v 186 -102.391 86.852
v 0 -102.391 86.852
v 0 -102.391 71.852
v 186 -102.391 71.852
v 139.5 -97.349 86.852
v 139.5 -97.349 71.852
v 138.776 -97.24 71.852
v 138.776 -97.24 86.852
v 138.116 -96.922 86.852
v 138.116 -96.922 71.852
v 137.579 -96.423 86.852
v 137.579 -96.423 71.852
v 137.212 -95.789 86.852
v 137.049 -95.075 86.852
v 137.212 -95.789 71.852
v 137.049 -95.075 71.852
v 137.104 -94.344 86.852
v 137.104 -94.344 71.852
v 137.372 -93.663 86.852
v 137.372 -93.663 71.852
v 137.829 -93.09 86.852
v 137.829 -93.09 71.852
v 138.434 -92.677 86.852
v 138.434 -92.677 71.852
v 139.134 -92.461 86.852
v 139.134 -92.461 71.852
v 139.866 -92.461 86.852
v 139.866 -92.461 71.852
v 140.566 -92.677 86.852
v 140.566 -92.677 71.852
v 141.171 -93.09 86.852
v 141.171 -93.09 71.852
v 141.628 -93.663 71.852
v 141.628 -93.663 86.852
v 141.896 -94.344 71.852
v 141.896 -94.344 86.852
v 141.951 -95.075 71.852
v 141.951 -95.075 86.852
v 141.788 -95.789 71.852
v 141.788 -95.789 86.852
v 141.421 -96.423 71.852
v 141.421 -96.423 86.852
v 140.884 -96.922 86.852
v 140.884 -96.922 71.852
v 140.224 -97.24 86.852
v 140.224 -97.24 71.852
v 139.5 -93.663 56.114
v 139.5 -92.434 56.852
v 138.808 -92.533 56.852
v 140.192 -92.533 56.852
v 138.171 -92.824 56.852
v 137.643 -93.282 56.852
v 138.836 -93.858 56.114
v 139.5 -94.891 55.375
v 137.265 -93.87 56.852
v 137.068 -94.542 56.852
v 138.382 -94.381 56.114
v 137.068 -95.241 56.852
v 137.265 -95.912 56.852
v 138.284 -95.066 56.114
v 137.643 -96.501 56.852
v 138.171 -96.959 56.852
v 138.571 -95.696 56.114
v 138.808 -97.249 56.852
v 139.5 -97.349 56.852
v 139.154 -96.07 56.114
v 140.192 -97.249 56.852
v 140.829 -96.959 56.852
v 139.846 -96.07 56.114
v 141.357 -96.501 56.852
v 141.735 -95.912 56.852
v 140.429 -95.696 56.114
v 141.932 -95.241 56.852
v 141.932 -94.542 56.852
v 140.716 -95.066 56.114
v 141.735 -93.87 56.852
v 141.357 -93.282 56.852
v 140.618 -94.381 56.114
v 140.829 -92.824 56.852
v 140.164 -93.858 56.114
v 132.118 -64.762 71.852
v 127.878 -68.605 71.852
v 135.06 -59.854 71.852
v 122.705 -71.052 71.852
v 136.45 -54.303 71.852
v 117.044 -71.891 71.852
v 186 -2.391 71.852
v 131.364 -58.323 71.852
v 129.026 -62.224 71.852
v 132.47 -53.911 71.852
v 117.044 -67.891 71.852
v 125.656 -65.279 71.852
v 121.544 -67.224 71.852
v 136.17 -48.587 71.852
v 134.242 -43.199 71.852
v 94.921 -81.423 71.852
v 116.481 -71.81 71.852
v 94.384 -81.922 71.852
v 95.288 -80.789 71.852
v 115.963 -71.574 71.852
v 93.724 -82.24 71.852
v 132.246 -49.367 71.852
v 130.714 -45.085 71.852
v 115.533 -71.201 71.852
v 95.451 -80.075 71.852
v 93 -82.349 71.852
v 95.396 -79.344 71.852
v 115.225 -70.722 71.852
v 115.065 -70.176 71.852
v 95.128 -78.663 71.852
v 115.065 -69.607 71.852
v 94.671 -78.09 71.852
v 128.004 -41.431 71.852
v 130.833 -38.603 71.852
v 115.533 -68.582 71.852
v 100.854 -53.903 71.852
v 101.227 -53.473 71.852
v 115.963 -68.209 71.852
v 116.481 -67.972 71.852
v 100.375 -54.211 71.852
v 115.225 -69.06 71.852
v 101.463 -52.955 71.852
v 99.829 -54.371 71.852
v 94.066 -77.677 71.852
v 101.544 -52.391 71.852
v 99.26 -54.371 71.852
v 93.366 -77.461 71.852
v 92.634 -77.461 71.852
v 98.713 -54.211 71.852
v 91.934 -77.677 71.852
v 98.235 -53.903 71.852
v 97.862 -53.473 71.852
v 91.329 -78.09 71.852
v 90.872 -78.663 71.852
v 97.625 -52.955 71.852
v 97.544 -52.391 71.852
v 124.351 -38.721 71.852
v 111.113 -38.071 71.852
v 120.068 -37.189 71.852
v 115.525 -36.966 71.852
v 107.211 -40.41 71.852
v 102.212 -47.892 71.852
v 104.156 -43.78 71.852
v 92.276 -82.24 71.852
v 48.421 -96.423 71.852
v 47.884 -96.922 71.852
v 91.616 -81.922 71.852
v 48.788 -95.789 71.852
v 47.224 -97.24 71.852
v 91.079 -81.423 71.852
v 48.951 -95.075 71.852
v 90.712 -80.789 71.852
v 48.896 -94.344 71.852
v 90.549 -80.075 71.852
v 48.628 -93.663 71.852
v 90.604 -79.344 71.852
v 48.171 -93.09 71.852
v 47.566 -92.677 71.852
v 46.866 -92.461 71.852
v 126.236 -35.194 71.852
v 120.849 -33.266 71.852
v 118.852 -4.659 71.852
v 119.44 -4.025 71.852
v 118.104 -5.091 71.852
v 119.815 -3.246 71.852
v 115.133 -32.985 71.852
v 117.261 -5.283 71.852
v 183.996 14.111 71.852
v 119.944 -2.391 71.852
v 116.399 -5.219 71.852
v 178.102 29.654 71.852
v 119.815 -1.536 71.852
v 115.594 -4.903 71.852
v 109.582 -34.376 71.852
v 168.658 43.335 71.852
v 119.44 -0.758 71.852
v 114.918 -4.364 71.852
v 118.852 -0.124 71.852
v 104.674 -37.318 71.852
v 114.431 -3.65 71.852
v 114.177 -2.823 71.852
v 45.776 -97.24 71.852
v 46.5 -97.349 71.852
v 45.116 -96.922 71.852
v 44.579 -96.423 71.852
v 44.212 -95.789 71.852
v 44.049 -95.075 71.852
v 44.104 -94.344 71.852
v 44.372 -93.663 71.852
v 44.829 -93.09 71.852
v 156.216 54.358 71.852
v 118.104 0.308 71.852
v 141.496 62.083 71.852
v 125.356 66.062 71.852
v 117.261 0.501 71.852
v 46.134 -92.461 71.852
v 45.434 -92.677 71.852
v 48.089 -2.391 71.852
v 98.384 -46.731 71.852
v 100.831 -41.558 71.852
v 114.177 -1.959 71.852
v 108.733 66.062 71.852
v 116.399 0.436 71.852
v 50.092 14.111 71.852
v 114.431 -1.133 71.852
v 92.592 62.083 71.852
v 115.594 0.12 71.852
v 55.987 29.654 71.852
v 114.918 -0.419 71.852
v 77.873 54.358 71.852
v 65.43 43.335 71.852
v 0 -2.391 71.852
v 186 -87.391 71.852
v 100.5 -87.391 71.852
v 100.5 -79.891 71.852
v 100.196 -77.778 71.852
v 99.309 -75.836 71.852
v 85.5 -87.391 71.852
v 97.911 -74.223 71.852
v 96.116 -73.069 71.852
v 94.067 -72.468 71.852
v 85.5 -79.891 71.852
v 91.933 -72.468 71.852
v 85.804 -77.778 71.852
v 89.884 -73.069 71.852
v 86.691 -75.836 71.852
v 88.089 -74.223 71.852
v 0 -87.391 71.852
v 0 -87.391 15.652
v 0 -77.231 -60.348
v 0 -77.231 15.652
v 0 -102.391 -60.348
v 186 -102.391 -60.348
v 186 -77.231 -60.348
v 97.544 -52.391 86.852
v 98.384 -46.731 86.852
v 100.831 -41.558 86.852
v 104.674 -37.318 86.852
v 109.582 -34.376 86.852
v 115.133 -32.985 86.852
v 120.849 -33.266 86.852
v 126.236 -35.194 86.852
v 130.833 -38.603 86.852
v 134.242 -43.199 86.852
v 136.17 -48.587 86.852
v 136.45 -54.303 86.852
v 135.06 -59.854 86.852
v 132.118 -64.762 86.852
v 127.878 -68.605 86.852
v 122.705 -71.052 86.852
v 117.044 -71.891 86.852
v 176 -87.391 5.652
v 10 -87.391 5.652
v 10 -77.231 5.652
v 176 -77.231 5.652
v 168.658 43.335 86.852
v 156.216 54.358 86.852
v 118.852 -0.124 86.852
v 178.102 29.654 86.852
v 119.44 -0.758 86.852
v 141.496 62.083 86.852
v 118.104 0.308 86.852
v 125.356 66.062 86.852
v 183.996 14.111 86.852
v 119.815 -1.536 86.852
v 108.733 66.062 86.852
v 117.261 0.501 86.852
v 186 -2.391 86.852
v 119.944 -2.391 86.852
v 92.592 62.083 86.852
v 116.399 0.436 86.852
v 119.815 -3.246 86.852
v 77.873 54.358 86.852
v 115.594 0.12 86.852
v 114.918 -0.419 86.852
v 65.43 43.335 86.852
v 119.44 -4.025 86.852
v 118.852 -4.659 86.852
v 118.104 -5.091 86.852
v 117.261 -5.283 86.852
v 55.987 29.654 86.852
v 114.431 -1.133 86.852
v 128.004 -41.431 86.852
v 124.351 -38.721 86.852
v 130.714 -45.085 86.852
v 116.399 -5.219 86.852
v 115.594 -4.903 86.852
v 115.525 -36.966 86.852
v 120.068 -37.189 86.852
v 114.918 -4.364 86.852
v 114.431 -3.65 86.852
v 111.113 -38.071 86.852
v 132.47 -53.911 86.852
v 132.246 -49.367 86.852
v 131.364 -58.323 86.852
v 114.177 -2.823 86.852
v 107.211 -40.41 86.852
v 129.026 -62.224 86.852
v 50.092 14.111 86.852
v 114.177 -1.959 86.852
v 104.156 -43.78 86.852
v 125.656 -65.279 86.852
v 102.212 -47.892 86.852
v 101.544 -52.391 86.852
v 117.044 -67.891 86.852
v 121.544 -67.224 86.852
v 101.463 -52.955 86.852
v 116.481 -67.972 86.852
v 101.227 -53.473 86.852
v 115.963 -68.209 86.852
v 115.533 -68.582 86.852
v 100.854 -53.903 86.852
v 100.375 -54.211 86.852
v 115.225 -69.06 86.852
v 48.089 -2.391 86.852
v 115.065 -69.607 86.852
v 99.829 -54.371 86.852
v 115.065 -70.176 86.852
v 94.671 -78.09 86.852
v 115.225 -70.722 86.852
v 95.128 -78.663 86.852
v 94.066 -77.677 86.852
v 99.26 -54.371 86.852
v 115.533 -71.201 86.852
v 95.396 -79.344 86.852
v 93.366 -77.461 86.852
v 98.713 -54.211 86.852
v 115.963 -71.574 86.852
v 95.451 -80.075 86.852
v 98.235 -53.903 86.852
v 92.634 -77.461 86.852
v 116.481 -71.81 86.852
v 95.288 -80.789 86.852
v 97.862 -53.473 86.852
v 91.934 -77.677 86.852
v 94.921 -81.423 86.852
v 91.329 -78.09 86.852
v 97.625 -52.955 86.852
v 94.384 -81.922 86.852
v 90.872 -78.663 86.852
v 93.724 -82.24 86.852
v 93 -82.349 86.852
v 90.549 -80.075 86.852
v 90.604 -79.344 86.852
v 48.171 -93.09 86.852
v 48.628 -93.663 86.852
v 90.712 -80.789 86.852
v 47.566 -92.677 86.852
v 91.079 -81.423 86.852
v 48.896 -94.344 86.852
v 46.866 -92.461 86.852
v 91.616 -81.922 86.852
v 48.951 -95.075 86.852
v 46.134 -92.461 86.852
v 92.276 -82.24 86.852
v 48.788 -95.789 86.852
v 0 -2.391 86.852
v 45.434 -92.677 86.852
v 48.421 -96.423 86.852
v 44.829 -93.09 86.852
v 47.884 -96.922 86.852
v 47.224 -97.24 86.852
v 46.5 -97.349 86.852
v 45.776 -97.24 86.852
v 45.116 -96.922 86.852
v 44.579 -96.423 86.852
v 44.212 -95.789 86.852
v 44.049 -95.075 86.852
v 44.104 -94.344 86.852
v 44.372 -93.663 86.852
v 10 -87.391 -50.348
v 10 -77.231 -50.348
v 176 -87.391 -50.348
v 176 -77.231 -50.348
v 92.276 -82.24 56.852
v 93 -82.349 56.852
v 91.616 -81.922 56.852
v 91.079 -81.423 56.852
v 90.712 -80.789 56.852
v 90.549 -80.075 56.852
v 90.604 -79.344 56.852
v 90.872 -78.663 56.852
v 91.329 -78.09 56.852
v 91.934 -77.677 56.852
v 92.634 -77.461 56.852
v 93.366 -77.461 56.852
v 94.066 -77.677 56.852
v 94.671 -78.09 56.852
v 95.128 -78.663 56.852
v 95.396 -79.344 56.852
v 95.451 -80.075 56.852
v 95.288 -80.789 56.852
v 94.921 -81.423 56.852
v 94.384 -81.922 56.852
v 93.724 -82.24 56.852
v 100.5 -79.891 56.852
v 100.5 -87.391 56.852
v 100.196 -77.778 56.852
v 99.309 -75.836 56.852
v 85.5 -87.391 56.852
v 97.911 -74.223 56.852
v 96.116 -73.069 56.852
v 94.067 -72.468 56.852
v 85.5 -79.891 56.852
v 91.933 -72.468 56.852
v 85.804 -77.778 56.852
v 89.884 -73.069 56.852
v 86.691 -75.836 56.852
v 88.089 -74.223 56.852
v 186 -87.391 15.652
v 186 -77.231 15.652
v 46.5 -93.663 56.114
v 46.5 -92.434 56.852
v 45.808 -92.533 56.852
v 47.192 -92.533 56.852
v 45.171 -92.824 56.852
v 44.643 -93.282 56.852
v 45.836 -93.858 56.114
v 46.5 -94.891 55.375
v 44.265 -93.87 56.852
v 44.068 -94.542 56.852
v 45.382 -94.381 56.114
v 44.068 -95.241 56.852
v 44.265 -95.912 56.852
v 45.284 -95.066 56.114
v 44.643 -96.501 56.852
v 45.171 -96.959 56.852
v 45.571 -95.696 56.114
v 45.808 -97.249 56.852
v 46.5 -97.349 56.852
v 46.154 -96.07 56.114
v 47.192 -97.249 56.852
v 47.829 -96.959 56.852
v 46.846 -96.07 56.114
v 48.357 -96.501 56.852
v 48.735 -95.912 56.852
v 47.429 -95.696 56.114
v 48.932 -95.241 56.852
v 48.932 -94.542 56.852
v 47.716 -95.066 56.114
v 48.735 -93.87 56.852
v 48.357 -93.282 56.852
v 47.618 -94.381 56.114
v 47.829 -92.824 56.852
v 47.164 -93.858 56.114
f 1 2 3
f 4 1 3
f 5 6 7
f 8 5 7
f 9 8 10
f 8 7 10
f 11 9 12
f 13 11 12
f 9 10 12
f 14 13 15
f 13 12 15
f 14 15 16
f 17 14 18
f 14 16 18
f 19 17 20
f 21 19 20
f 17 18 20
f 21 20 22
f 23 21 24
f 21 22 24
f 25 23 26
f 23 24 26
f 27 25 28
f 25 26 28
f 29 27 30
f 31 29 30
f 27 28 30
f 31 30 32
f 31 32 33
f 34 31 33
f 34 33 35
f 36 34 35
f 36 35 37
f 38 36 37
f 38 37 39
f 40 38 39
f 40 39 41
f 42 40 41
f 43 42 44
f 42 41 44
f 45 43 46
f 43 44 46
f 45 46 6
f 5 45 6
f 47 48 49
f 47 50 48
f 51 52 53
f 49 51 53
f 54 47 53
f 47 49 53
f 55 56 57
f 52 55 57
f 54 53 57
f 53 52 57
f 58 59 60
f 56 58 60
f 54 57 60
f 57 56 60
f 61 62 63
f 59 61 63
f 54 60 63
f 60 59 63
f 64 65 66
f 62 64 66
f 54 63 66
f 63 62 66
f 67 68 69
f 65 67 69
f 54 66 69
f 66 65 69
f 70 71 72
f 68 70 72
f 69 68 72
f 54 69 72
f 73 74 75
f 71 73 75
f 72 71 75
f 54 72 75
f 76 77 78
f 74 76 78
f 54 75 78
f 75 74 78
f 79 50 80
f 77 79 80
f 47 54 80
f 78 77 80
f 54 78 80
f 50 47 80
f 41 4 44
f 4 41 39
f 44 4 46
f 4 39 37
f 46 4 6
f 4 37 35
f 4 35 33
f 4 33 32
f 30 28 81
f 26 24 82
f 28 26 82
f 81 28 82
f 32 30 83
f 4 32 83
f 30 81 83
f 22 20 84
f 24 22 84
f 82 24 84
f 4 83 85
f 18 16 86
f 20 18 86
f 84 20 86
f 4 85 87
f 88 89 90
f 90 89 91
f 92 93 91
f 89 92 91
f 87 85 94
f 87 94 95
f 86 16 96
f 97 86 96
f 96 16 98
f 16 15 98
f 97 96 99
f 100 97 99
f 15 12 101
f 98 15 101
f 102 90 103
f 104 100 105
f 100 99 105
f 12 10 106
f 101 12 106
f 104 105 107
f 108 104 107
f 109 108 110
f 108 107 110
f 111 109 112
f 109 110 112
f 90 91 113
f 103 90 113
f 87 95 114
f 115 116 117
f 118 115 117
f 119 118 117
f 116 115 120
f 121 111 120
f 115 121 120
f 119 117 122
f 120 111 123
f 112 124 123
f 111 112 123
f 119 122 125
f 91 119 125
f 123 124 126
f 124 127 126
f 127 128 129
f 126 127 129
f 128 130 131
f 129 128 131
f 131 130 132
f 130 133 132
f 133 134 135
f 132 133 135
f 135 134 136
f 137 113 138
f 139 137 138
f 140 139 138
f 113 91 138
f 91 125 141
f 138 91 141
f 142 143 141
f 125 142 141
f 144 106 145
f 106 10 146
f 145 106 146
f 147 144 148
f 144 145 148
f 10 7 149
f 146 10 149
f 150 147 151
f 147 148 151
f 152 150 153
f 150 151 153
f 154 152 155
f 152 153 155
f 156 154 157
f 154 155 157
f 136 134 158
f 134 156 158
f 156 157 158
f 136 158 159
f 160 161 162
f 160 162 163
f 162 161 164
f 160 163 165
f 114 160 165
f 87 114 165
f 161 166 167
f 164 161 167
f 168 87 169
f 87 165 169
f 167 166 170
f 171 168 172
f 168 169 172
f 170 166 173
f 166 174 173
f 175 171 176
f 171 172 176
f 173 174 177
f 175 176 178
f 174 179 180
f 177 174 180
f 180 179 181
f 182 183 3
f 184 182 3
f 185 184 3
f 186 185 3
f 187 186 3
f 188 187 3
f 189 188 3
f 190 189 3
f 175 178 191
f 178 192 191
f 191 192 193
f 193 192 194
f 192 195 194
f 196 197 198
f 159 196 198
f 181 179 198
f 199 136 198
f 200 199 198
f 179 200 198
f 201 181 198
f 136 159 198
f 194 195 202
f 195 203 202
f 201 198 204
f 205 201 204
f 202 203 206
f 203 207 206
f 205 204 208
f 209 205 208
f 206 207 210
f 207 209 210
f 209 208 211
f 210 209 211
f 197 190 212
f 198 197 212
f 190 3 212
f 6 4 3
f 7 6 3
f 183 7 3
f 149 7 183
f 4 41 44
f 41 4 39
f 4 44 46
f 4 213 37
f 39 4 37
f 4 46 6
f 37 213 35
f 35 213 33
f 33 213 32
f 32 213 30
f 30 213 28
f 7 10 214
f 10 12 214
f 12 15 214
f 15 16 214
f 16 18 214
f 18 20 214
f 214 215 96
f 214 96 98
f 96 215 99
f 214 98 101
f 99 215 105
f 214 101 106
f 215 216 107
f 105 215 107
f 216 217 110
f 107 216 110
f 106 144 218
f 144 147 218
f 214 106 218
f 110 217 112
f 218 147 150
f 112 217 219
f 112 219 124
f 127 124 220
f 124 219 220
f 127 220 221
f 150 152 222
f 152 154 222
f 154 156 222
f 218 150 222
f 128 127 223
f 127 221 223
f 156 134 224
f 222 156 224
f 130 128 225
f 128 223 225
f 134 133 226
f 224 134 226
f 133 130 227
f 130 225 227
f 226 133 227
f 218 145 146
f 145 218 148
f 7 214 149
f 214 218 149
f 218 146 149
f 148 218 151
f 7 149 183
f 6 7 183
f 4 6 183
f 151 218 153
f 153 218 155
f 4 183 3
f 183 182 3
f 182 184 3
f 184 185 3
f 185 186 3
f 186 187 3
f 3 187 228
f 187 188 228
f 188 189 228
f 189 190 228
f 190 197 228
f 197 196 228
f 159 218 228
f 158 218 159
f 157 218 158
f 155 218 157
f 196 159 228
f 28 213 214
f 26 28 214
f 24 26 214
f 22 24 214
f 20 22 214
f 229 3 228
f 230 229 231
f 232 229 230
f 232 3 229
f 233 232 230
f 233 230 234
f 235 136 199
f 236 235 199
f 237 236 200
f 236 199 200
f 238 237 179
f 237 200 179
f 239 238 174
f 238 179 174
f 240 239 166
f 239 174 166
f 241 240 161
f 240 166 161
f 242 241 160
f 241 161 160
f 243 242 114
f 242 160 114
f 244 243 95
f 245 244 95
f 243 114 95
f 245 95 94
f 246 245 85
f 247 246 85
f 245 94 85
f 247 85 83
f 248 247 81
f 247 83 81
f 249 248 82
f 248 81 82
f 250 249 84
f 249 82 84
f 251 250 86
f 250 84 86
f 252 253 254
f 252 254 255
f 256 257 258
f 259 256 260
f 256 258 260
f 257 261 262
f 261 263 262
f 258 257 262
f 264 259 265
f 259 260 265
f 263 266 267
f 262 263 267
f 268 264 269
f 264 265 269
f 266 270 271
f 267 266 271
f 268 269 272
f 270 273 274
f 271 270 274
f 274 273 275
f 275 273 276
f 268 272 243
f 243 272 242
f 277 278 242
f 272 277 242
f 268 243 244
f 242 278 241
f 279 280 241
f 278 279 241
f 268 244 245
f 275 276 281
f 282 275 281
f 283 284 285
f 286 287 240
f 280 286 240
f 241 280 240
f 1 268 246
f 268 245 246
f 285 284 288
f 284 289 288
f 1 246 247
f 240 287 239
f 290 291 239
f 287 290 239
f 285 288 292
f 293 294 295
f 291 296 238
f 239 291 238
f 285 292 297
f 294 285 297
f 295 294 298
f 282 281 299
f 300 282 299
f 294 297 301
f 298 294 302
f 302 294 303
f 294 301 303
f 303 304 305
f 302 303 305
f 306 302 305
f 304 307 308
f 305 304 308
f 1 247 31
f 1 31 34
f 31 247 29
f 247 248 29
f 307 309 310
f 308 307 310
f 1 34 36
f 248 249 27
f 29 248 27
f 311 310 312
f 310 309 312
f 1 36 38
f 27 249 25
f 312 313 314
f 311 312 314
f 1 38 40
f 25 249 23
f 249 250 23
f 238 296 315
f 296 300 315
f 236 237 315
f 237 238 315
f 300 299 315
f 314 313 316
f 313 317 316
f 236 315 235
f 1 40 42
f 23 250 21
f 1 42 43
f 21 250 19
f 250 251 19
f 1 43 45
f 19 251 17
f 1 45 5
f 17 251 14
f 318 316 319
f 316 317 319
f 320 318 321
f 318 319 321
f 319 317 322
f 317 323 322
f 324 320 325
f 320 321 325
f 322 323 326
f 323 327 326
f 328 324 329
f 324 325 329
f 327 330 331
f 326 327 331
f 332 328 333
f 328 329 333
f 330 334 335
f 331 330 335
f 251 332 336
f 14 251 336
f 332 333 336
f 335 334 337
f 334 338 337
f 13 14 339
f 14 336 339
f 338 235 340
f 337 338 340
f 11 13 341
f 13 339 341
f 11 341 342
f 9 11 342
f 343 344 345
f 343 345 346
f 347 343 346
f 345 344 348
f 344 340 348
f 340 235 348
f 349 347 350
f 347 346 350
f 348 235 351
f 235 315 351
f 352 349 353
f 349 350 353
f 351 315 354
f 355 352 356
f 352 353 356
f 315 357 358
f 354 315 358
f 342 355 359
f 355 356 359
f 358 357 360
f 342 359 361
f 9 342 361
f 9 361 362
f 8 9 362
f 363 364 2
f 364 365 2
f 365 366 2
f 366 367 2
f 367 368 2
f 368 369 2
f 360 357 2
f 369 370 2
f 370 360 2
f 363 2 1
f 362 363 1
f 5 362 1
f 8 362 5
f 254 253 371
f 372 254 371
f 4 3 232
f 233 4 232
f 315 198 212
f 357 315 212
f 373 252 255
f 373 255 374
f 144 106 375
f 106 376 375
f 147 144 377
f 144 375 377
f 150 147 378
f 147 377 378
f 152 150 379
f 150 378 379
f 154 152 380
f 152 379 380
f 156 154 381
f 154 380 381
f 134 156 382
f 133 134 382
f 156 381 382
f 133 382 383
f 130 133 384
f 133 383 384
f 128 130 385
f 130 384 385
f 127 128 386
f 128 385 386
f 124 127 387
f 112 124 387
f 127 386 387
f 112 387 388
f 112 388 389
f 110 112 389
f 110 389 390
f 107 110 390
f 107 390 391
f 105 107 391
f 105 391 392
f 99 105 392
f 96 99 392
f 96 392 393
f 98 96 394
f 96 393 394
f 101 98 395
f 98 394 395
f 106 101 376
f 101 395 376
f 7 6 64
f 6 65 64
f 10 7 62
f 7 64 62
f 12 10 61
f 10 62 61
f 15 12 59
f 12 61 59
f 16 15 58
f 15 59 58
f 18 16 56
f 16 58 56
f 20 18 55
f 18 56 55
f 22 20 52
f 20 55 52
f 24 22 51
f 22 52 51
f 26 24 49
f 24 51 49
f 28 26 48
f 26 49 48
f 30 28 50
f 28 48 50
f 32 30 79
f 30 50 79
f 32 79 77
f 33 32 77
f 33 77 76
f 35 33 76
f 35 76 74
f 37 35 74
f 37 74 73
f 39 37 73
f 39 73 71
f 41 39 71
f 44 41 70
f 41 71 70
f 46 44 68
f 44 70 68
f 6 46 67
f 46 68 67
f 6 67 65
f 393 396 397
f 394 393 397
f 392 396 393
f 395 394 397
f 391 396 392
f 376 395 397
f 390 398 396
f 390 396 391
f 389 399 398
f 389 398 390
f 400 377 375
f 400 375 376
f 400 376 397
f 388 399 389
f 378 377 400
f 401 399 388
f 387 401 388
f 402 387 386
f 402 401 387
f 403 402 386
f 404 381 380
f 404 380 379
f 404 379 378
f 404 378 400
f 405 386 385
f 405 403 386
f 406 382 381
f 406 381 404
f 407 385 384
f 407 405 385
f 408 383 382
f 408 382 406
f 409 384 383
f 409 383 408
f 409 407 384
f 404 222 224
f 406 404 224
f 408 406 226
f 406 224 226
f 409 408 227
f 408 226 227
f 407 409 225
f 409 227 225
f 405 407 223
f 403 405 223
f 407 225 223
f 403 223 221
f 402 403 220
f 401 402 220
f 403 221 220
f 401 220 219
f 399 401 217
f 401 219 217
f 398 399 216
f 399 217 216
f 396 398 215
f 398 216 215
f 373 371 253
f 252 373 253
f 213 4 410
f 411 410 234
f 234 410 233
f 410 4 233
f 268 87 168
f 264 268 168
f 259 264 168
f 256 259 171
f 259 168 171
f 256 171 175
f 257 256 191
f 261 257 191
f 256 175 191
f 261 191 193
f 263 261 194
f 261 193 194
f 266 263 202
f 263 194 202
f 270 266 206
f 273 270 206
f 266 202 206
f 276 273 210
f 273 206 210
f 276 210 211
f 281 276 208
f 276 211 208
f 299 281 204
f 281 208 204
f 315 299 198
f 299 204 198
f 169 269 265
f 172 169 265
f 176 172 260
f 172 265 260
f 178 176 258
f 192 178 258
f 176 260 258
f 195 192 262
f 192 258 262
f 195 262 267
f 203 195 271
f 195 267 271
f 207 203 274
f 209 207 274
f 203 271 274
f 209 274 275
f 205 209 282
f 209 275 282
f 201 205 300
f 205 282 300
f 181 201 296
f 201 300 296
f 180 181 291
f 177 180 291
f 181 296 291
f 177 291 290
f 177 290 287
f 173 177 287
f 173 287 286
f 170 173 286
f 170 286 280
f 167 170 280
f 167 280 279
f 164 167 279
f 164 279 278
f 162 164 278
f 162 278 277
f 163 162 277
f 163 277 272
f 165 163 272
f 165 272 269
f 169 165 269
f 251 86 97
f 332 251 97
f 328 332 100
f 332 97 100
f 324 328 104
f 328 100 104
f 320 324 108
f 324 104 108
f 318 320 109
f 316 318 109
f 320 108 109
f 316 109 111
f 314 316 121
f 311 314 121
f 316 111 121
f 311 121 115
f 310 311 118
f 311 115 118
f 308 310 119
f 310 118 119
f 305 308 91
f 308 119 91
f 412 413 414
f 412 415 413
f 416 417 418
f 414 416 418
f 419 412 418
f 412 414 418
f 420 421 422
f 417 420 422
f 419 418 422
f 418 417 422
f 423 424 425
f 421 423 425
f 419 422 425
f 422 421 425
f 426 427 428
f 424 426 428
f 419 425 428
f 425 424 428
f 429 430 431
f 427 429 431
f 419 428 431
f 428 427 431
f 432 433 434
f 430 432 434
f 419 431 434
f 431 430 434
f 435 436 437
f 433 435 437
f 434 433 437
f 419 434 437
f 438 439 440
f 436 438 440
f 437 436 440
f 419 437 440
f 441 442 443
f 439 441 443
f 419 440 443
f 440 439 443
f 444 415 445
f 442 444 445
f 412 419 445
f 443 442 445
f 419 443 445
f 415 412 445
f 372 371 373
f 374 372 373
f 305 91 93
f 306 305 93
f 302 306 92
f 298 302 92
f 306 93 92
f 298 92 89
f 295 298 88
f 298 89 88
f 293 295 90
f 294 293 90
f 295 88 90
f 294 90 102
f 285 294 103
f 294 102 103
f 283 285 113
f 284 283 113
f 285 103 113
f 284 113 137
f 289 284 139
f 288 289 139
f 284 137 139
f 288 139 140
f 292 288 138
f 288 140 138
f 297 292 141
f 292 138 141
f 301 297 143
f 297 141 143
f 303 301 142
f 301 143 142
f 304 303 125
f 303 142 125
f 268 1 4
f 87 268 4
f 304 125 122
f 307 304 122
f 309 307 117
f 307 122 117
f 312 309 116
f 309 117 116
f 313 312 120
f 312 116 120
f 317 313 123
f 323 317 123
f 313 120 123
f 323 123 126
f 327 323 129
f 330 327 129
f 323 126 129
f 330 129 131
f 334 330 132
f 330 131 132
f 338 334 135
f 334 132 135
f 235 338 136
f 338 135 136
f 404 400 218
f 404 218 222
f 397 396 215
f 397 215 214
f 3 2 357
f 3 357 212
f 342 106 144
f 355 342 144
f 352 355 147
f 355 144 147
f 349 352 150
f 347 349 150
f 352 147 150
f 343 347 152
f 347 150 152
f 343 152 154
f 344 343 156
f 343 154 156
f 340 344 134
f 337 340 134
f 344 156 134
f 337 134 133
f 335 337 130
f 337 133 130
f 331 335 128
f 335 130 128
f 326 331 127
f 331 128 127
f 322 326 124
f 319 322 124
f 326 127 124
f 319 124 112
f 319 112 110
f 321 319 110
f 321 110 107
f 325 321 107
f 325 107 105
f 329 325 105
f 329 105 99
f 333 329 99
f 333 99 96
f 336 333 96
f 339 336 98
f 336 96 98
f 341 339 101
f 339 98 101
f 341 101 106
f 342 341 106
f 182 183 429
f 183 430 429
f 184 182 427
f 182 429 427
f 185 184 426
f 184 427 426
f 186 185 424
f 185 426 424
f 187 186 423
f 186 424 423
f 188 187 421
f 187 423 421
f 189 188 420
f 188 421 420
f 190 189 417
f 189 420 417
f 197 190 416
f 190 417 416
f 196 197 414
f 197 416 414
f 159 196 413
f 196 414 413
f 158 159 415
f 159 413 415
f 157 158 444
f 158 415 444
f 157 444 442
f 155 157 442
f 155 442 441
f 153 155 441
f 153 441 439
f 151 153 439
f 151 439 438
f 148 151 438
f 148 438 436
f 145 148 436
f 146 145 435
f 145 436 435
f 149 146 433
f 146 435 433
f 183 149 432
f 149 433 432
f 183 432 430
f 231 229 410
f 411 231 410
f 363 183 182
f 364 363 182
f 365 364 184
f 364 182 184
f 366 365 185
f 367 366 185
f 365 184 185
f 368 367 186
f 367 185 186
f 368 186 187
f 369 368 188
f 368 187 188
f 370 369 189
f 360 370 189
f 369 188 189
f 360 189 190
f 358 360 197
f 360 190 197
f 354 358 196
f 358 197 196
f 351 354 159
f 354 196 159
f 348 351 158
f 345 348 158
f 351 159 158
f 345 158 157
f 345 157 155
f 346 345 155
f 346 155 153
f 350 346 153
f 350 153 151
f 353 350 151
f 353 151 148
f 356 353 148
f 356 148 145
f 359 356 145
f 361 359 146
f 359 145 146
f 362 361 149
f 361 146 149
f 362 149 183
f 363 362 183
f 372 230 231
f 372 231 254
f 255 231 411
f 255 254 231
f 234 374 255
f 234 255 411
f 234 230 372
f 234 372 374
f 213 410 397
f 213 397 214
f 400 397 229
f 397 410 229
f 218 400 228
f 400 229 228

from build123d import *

# Parameters (mm, degrees)
BOSS_EXTRUDE2_DEPTH       = 186
SKETCH3_W                 = 186
SKETCH3_H                 = 76
SKETCH3_W_2               = 166
SKETCH3_H_2               = 56
BOSS_EXTRUDE3_DEPTH       = 10.16
CUT_EXTRUDE5_DEPTH        = 15
M5_CLEARANCE_HOLE1_D      = 5.8
CUT_EXTRUDE6_DEPTH        = 15
BOSS_EXTRUDE4_DEPTH       = 15
F_8_CLEARANCE_HOLE1_D     = 4.9149
F_8_CLEARANCE_HOLE1_DEPTH = 30
F_8_CLEARANCE_HOLE1_TIP   = 1.476584928


with BuildPart() as part:
    # Sketch2 → Boss-Extrude2 (new body)
    with BuildSketch(Plane(origin=(0, 0, 0), x_dir=(0, 0, -1), z_dir=(1, 0, 0))):
        Polygon((-86.851953943, 67.608740711), (-86.851953943, -102.391259289), (60.348046057, -102.391259289), (60.348046057, -87.391259289), (-71.851953943, -87.391259289), (-71.851953943, 67.608740711), align=None)
    extrude(amount=BOSS_EXTRUDE2_DEPTH)

    # Sketch3 → Boss-Extrude3 (add)
    with BuildSketch(Plane(origin=(0, -87.391259289, 0), x_dir=(1, 0, 0), z_dir=(0, 1, 0))):
        with Locations((93, 22.348046057)):
            Rectangle(SKETCH3_W, SKETCH3_H)
        with Locations((93, 22.348046057)):
            Rectangle(SKETCH3_W_2, SKETCH3_H_2, mode=Mode.SUBTRACT)
    extrude(amount=BOSS_EXTRUDE3_DEPTH)

    # Sketch6 → Cut-Extrude5 (cut)
    with BuildSketch(Plane(origin=(0, 0, 71.851953943), x_dir=(-1, 0, 0), z_dir=(0, 0, -1))):
        with BuildLine():
            ThreePointArc((-97.544250495, -52.391259289), (-130.832832728, -38.602677055), (-117.044250495, -71.891259289))
            ThreePointArc((-117.044250495, -71.891259289), (-115.044250495, -69.891259289), (-117.044250495, -67.891259289))
            ThreePointArc((-117.044250495, -67.891259289), (-128.004405604, -41.43110418), (-101.544250495, -52.391259289))
            ThreePointArc((-101.544250495, -52.391259289), (-99.544250495, -54.391259289), (-97.544250495, -52.391259289))
        make_face()
    extrude(amount=-CUT_EXTRUDE5_DEPTH, mode=Mode.SUBTRACT)

    # M5 Clearance Hole1 (through all)
    with Locations(Plane(origin=(117.044250495, -2.391259289, 71.851953943), x_dir=(-1, 0, 0), z_dir=(0, 0, -1))):
        with Locations((0, 0)):
            Hole(M5_CLEARANCE_HOLE1_D / 2)

    # Sketch13 → Cut-Extrude6 (cut)
    with BuildSketch(Plane(origin=(0, 0, 71.851953943), x_dir=(-1, 0, 0), z_dir=(0, 0, -1))):
        with BuildLine():
            Line((-48.088500991, -2.391259289), (0, -2.391259289))
            Line((0, -2.391259289), (0, 67.608740711))
            Line((0, 67.608740711), (-186, 67.608740711))
            Line((-186, 67.608740711), (-186, -2.391259289))
            ThreePointArc((-186, -2.391259289), (-117.044250495, 66.564490216), (-48.088500991, -2.391259289))
        make_face()
    extrude(amount=-CUT_EXTRUDE6_DEPTH, mode=Mode.SUBTRACT)

    # Sketch16 → Boss-Extrude4 (add)
    with BuildSketch(Plane(origin=(0, 0, 71.851953943), x_dir=(-1, 0, 0), z_dir=(0, 0, -1))):
        with BuildLine():
            Line((-100.5, -79.891259289), (-100.5, -87.391259289))
            Line((-100.5, -87.391259289), (-85.5, -87.391259289))
            Line((-85.5, -87.391259289), (-85.5, -79.891259289))
            ThreePointArc((-85.5, -79.891259289), (-93, -72.391259289), (-100.5, -79.891259289))
        make_face()
    extrude(amount=BOSS_EXTRUDE4_DEPTH)

    # #8 Clearance Hole1
    with Locations(Plane(origin=(46.5, -94.891259289, 86.851953943), x_dir=(0, 1, 0), z_dir=(0, 0, 1))):
        with Locations((0, 0), (15, -46.5), (0, -93)):
            Hole(F_8_CLEARANCE_HOLE1_D / 2, depth=F_8_CLEARANCE_HOLE1_DEPTH)
            with Locations((0, 0, -(F_8_CLEARANCE_HOLE1_DEPTH + F_8_CLEARANCE_HOLE1_TIP / 2))):  # 118° drill point
                Cone(0, F_8_CLEARANCE_HOLE1_D / 2, F_8_CLEARANCE_HOLE1_TIP, mode=Mode.SUBTRACT)


with BuildPart() as body_2:
    # Split2: the piece on the far side of the plane
    add(part.part)
    split(bisect_by=Plane(origin=(0, 0, 71.851953943), x_dir=(-1, 0, 0), z_dir=(0, 0, -1)), keep=Keep.BOTTOM)


with BuildPart() as part_1:
    add(part.part)

    # Split2
    split(bisect_by=Plane(origin=(0, 0, 71.851953943), x_dir=(-1, 0, 0), z_dir=(0, 0, -1)), keep=Keep.TOP)


solid = Compound([body_2.part, part_1.part])
